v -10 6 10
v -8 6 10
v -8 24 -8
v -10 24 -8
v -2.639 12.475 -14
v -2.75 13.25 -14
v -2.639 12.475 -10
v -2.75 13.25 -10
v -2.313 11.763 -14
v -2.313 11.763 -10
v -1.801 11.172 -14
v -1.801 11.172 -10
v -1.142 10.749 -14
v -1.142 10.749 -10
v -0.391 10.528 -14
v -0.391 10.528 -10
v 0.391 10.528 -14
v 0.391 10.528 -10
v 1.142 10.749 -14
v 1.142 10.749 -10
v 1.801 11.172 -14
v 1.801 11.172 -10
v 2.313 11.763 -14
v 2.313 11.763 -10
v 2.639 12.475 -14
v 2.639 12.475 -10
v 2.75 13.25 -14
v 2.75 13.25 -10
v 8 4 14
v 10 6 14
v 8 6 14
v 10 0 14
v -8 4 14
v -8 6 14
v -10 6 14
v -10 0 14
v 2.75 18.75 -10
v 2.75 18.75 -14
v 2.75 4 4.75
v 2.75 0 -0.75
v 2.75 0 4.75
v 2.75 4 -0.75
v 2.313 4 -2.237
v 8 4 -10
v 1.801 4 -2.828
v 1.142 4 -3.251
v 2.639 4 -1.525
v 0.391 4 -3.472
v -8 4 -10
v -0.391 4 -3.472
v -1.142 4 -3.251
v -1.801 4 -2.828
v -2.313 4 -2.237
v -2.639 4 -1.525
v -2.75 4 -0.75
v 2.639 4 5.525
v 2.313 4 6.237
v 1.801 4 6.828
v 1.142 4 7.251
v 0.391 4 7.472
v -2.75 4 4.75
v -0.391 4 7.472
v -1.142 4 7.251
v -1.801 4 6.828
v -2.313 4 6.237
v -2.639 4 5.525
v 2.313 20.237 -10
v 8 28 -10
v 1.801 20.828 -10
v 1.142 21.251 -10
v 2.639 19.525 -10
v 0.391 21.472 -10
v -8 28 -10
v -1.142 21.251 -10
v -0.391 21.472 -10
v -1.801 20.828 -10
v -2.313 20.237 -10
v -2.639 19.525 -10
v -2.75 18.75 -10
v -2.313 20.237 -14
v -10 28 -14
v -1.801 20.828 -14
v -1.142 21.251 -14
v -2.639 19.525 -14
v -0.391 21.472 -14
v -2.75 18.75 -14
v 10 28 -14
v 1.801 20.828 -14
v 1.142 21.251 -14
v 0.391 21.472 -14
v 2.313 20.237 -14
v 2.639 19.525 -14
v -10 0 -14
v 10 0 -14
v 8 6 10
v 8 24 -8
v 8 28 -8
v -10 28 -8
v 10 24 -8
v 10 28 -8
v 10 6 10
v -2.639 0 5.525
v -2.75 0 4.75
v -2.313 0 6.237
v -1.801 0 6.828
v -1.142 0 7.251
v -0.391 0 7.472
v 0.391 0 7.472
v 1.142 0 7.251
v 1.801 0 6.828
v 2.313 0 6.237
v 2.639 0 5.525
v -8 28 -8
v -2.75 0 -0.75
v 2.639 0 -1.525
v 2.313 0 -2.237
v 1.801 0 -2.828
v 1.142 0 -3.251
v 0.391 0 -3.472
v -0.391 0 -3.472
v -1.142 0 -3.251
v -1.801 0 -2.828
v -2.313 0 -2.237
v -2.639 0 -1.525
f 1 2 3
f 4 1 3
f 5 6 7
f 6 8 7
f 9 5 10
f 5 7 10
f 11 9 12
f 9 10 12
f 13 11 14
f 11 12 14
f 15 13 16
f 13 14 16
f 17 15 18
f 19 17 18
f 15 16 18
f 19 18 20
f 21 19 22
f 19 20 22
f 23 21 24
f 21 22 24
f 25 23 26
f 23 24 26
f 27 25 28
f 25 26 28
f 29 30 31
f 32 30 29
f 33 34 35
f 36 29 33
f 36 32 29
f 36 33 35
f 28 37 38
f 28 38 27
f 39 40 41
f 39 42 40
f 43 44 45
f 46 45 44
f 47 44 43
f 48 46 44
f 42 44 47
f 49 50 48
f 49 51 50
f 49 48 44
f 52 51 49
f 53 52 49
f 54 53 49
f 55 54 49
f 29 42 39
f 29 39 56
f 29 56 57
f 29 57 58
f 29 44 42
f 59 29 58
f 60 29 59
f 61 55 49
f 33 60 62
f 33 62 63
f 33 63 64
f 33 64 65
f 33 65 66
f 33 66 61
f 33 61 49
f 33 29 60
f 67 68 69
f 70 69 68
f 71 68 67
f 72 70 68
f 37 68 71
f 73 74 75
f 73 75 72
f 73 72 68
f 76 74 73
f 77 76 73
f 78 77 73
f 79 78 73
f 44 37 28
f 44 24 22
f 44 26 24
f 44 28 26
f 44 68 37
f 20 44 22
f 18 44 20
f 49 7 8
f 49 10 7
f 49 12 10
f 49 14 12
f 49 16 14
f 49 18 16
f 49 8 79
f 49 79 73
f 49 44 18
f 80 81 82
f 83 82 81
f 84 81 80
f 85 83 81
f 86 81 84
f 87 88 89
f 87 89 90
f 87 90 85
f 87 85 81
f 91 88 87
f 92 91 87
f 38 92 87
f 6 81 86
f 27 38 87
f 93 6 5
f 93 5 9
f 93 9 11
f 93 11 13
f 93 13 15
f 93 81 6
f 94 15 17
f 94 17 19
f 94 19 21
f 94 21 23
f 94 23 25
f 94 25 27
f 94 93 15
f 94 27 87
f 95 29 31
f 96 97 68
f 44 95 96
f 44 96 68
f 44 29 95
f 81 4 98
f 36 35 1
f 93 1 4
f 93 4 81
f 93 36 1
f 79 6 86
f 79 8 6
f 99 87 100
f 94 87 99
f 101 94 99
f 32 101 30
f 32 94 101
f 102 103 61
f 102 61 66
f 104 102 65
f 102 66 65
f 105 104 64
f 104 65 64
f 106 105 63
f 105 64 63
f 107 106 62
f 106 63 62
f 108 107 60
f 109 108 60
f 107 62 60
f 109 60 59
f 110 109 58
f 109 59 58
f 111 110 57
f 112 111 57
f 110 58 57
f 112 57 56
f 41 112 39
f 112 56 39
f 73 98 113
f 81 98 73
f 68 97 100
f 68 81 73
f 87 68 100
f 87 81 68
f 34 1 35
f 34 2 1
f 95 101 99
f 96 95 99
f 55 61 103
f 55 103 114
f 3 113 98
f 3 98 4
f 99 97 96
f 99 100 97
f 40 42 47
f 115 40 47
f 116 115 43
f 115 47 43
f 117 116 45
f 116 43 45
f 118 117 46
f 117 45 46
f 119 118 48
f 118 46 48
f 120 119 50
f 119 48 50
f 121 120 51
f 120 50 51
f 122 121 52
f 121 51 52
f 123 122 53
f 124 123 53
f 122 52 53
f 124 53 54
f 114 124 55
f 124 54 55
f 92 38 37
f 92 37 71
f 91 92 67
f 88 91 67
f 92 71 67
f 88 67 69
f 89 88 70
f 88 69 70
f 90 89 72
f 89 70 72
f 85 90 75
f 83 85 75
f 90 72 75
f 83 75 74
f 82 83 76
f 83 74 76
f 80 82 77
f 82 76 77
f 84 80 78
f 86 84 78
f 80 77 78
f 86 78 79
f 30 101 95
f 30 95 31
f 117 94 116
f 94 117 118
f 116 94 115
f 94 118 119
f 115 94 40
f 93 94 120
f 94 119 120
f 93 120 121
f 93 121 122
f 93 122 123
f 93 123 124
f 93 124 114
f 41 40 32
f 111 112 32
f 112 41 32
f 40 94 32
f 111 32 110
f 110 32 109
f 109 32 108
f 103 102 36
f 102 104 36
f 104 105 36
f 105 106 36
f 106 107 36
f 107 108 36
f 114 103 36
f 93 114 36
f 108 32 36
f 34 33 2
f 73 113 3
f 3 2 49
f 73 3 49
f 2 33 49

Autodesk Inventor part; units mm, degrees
ref_plane "YZ Plane" through (0, 0, 0) normal (1, 0, 0) x (0, 1, 0)
ref_plane "XZ Plane" through (0, 0, 0) normal (0, 1, 0) x (-1, 0, 0)
ref_plane "XY Plane" through (0, 0, 0) normal (0, 0, 1) x (1, 0, 0)
sketch "Sketch1" plane through (0, 0, 0) normal (0, 1, 0) x (-1, 0, 0)
  line L0 (-10, 14) -> (10, 14)
  line L1 (10, 14) -> (10, -14)
  line L2 (10, -14) -> (-10, -14)
  line L3 (-10, -14) -> (-10, 14)
  line L4 (-10, 14) -> (10, -14) construction
  line L5 (10, 14) -> (-10, -14) construction
  point P0 (0, 0)
  dimension "d0" = 28
  dimension "d1" = 20
extrude "Extrusion1" add sketch "Sketch1" along normal blind 4
sketch "Sketch2" plane through (0, 4, 0) normal (0, 1, 0) x (1, 0, 0)
  line L0 (10, 14) -> (-10, 14) projected
  line L1 (-10, 14) -> (10, 14)
  line L2 (10, 14) -> (10, 10)
  line L3 (10, 10) -> (-10, 10)
  line L4 (-10, 10) -> (-10, 14)
  point P0 (0, 0)
  dimension "d4" = 4
extrude "Extrusion2" add sketch "Sketch2" along normal blind 24
sketch "Sketch3" plane through (0, 4, 0) normal (0, 1, 0) x (1, 0, 0)
  line L0 (-10, 10) -> (10, 10) projected
  line L1 (10, -14) -> (8, -14)
  line L2 (8, -14) -> (8, 10)
  line L3 (8, 10) -> (10, 10)
  line L4 (10, 10) -> (10, -14)
  line L5 (-10, -14) -> (-8, -14)
  line L6 (-8, -14) -> (-8, 10)
  line L7 (-8, 10) -> (-10, 10)
  line L8 (-10, 10) -> (-10, -14)
  point P0 (0, 0)
  dimension "d7" = 2
  dimension "d8" = 2
extrude "Extrusion3" add sketch "Sketch3" along normal blind 24
sketch "Sketch4" plane through (10, 0, 14) normal (1, 0, 0) x (0, 0, -1)
  line L0 (0, 4) -> (0, 28) projected
  line L1 (24, 28) -> (24, 4) projected
  line L2 (0, 28) -> (24, 28)
  line L3 (24, 28) -> (24, 4)
  line L4 (24, 4) -> (0, 4)
  line L5 (0, 4) -> (0, 28)
  line L6 (0, 28) -> (22, 28)
  line L7 (22, 28) -> (22, 6)
  line L8 (22, 6) -> (0, 6)
  line L9 (0, 6) -> (0, 28)
  line L10 (4, 6) -> (22, 24)
  point P0 (14, 0)
  dimension "d11" = 2
  dimension "d12" = 2
  dimension "d13" = 4
  dimension "d14" = 4
extrude "Extrusion4" cut sketch "Sketch4" against normal blind 24 contours L0 L2 L7 L10 L8
sketch "Sketch5" plane through (0, 4, 0) normal (0, 1, 0) x (1, 0, 0)
  line L0 (-8, -14) -> (8, -14) projected
  line L1 (0, -14) -> (0, 10)
  line L2 (-8, 10) -> (8, 10) projected
  line L3 (2.75, -4.75) -> (-2.75, -4.75)
  line L4 (-2.75, -4.75) -> (-2.75, 0.75)
  line L5 (-2.75, 0.75) -> (2.75, 0.75)
  line L6 (2.75, 0.75) -> (2.75, -4.75)
  line L7 (2.75, -4.75) -> (-2.75, 0.75) construction
  line L8 (-2.75, -4.75) -> (2.75, 0.75) construction
  arc A0 (2.75, 0.75) -> (-2.75, 0.75) centre (0, 0.75) ccw
  arc A1 (-2.75, -4.75) -> (2.75, -4.75) centre (0, -4.75) ccw
  point P0 (0, 0)
  point P1 (0, -2)
  dimension "d17" = 5.5
  dimension "d18" = 5.5
extrude "Extrusion5" cut sketch "Sketch5" against normal blind 24
sketch "Sketch6" plane through (-8, 4, -10) normal (0, 0, 1) x (1, 0, 0)
  line L0 (0, 24) -> (16, 24) projected
  line L1 (8, 24) -> (8, 0)
  line L2 (10.75, 9.25) -> (5.25, 9.25)
  line L3 (5.25, 9.25) -> (5.25, 14.75)
  line L4 (5.25, 14.75) -> (10.75, 14.75)
  line L5 (10.75, 14.75) -> (10.75, 9.25)
  line L6 (10.75, 9.25) -> (5.25, 14.75) construction
  line L7 (5.25, 9.25) -> (10.75, 14.75) construction
  arc A0 (10.75, 14.75) -> (5.25, 14.75) centre (8, 14.75) ccw
  arc A1 (5.25, 9.25) -> (10.75, 9.25) centre (8, 9.25) ccw
  line L8 (0, 0) -> (16, 0) projected
  point P0 (8, 12)
  dimension "d21" = 5.5
  dimension "d22" = 5.5
extrude "Extrusion6" cut sketch "Sketch6" against normal blind 24
properties part number "2020-90"
